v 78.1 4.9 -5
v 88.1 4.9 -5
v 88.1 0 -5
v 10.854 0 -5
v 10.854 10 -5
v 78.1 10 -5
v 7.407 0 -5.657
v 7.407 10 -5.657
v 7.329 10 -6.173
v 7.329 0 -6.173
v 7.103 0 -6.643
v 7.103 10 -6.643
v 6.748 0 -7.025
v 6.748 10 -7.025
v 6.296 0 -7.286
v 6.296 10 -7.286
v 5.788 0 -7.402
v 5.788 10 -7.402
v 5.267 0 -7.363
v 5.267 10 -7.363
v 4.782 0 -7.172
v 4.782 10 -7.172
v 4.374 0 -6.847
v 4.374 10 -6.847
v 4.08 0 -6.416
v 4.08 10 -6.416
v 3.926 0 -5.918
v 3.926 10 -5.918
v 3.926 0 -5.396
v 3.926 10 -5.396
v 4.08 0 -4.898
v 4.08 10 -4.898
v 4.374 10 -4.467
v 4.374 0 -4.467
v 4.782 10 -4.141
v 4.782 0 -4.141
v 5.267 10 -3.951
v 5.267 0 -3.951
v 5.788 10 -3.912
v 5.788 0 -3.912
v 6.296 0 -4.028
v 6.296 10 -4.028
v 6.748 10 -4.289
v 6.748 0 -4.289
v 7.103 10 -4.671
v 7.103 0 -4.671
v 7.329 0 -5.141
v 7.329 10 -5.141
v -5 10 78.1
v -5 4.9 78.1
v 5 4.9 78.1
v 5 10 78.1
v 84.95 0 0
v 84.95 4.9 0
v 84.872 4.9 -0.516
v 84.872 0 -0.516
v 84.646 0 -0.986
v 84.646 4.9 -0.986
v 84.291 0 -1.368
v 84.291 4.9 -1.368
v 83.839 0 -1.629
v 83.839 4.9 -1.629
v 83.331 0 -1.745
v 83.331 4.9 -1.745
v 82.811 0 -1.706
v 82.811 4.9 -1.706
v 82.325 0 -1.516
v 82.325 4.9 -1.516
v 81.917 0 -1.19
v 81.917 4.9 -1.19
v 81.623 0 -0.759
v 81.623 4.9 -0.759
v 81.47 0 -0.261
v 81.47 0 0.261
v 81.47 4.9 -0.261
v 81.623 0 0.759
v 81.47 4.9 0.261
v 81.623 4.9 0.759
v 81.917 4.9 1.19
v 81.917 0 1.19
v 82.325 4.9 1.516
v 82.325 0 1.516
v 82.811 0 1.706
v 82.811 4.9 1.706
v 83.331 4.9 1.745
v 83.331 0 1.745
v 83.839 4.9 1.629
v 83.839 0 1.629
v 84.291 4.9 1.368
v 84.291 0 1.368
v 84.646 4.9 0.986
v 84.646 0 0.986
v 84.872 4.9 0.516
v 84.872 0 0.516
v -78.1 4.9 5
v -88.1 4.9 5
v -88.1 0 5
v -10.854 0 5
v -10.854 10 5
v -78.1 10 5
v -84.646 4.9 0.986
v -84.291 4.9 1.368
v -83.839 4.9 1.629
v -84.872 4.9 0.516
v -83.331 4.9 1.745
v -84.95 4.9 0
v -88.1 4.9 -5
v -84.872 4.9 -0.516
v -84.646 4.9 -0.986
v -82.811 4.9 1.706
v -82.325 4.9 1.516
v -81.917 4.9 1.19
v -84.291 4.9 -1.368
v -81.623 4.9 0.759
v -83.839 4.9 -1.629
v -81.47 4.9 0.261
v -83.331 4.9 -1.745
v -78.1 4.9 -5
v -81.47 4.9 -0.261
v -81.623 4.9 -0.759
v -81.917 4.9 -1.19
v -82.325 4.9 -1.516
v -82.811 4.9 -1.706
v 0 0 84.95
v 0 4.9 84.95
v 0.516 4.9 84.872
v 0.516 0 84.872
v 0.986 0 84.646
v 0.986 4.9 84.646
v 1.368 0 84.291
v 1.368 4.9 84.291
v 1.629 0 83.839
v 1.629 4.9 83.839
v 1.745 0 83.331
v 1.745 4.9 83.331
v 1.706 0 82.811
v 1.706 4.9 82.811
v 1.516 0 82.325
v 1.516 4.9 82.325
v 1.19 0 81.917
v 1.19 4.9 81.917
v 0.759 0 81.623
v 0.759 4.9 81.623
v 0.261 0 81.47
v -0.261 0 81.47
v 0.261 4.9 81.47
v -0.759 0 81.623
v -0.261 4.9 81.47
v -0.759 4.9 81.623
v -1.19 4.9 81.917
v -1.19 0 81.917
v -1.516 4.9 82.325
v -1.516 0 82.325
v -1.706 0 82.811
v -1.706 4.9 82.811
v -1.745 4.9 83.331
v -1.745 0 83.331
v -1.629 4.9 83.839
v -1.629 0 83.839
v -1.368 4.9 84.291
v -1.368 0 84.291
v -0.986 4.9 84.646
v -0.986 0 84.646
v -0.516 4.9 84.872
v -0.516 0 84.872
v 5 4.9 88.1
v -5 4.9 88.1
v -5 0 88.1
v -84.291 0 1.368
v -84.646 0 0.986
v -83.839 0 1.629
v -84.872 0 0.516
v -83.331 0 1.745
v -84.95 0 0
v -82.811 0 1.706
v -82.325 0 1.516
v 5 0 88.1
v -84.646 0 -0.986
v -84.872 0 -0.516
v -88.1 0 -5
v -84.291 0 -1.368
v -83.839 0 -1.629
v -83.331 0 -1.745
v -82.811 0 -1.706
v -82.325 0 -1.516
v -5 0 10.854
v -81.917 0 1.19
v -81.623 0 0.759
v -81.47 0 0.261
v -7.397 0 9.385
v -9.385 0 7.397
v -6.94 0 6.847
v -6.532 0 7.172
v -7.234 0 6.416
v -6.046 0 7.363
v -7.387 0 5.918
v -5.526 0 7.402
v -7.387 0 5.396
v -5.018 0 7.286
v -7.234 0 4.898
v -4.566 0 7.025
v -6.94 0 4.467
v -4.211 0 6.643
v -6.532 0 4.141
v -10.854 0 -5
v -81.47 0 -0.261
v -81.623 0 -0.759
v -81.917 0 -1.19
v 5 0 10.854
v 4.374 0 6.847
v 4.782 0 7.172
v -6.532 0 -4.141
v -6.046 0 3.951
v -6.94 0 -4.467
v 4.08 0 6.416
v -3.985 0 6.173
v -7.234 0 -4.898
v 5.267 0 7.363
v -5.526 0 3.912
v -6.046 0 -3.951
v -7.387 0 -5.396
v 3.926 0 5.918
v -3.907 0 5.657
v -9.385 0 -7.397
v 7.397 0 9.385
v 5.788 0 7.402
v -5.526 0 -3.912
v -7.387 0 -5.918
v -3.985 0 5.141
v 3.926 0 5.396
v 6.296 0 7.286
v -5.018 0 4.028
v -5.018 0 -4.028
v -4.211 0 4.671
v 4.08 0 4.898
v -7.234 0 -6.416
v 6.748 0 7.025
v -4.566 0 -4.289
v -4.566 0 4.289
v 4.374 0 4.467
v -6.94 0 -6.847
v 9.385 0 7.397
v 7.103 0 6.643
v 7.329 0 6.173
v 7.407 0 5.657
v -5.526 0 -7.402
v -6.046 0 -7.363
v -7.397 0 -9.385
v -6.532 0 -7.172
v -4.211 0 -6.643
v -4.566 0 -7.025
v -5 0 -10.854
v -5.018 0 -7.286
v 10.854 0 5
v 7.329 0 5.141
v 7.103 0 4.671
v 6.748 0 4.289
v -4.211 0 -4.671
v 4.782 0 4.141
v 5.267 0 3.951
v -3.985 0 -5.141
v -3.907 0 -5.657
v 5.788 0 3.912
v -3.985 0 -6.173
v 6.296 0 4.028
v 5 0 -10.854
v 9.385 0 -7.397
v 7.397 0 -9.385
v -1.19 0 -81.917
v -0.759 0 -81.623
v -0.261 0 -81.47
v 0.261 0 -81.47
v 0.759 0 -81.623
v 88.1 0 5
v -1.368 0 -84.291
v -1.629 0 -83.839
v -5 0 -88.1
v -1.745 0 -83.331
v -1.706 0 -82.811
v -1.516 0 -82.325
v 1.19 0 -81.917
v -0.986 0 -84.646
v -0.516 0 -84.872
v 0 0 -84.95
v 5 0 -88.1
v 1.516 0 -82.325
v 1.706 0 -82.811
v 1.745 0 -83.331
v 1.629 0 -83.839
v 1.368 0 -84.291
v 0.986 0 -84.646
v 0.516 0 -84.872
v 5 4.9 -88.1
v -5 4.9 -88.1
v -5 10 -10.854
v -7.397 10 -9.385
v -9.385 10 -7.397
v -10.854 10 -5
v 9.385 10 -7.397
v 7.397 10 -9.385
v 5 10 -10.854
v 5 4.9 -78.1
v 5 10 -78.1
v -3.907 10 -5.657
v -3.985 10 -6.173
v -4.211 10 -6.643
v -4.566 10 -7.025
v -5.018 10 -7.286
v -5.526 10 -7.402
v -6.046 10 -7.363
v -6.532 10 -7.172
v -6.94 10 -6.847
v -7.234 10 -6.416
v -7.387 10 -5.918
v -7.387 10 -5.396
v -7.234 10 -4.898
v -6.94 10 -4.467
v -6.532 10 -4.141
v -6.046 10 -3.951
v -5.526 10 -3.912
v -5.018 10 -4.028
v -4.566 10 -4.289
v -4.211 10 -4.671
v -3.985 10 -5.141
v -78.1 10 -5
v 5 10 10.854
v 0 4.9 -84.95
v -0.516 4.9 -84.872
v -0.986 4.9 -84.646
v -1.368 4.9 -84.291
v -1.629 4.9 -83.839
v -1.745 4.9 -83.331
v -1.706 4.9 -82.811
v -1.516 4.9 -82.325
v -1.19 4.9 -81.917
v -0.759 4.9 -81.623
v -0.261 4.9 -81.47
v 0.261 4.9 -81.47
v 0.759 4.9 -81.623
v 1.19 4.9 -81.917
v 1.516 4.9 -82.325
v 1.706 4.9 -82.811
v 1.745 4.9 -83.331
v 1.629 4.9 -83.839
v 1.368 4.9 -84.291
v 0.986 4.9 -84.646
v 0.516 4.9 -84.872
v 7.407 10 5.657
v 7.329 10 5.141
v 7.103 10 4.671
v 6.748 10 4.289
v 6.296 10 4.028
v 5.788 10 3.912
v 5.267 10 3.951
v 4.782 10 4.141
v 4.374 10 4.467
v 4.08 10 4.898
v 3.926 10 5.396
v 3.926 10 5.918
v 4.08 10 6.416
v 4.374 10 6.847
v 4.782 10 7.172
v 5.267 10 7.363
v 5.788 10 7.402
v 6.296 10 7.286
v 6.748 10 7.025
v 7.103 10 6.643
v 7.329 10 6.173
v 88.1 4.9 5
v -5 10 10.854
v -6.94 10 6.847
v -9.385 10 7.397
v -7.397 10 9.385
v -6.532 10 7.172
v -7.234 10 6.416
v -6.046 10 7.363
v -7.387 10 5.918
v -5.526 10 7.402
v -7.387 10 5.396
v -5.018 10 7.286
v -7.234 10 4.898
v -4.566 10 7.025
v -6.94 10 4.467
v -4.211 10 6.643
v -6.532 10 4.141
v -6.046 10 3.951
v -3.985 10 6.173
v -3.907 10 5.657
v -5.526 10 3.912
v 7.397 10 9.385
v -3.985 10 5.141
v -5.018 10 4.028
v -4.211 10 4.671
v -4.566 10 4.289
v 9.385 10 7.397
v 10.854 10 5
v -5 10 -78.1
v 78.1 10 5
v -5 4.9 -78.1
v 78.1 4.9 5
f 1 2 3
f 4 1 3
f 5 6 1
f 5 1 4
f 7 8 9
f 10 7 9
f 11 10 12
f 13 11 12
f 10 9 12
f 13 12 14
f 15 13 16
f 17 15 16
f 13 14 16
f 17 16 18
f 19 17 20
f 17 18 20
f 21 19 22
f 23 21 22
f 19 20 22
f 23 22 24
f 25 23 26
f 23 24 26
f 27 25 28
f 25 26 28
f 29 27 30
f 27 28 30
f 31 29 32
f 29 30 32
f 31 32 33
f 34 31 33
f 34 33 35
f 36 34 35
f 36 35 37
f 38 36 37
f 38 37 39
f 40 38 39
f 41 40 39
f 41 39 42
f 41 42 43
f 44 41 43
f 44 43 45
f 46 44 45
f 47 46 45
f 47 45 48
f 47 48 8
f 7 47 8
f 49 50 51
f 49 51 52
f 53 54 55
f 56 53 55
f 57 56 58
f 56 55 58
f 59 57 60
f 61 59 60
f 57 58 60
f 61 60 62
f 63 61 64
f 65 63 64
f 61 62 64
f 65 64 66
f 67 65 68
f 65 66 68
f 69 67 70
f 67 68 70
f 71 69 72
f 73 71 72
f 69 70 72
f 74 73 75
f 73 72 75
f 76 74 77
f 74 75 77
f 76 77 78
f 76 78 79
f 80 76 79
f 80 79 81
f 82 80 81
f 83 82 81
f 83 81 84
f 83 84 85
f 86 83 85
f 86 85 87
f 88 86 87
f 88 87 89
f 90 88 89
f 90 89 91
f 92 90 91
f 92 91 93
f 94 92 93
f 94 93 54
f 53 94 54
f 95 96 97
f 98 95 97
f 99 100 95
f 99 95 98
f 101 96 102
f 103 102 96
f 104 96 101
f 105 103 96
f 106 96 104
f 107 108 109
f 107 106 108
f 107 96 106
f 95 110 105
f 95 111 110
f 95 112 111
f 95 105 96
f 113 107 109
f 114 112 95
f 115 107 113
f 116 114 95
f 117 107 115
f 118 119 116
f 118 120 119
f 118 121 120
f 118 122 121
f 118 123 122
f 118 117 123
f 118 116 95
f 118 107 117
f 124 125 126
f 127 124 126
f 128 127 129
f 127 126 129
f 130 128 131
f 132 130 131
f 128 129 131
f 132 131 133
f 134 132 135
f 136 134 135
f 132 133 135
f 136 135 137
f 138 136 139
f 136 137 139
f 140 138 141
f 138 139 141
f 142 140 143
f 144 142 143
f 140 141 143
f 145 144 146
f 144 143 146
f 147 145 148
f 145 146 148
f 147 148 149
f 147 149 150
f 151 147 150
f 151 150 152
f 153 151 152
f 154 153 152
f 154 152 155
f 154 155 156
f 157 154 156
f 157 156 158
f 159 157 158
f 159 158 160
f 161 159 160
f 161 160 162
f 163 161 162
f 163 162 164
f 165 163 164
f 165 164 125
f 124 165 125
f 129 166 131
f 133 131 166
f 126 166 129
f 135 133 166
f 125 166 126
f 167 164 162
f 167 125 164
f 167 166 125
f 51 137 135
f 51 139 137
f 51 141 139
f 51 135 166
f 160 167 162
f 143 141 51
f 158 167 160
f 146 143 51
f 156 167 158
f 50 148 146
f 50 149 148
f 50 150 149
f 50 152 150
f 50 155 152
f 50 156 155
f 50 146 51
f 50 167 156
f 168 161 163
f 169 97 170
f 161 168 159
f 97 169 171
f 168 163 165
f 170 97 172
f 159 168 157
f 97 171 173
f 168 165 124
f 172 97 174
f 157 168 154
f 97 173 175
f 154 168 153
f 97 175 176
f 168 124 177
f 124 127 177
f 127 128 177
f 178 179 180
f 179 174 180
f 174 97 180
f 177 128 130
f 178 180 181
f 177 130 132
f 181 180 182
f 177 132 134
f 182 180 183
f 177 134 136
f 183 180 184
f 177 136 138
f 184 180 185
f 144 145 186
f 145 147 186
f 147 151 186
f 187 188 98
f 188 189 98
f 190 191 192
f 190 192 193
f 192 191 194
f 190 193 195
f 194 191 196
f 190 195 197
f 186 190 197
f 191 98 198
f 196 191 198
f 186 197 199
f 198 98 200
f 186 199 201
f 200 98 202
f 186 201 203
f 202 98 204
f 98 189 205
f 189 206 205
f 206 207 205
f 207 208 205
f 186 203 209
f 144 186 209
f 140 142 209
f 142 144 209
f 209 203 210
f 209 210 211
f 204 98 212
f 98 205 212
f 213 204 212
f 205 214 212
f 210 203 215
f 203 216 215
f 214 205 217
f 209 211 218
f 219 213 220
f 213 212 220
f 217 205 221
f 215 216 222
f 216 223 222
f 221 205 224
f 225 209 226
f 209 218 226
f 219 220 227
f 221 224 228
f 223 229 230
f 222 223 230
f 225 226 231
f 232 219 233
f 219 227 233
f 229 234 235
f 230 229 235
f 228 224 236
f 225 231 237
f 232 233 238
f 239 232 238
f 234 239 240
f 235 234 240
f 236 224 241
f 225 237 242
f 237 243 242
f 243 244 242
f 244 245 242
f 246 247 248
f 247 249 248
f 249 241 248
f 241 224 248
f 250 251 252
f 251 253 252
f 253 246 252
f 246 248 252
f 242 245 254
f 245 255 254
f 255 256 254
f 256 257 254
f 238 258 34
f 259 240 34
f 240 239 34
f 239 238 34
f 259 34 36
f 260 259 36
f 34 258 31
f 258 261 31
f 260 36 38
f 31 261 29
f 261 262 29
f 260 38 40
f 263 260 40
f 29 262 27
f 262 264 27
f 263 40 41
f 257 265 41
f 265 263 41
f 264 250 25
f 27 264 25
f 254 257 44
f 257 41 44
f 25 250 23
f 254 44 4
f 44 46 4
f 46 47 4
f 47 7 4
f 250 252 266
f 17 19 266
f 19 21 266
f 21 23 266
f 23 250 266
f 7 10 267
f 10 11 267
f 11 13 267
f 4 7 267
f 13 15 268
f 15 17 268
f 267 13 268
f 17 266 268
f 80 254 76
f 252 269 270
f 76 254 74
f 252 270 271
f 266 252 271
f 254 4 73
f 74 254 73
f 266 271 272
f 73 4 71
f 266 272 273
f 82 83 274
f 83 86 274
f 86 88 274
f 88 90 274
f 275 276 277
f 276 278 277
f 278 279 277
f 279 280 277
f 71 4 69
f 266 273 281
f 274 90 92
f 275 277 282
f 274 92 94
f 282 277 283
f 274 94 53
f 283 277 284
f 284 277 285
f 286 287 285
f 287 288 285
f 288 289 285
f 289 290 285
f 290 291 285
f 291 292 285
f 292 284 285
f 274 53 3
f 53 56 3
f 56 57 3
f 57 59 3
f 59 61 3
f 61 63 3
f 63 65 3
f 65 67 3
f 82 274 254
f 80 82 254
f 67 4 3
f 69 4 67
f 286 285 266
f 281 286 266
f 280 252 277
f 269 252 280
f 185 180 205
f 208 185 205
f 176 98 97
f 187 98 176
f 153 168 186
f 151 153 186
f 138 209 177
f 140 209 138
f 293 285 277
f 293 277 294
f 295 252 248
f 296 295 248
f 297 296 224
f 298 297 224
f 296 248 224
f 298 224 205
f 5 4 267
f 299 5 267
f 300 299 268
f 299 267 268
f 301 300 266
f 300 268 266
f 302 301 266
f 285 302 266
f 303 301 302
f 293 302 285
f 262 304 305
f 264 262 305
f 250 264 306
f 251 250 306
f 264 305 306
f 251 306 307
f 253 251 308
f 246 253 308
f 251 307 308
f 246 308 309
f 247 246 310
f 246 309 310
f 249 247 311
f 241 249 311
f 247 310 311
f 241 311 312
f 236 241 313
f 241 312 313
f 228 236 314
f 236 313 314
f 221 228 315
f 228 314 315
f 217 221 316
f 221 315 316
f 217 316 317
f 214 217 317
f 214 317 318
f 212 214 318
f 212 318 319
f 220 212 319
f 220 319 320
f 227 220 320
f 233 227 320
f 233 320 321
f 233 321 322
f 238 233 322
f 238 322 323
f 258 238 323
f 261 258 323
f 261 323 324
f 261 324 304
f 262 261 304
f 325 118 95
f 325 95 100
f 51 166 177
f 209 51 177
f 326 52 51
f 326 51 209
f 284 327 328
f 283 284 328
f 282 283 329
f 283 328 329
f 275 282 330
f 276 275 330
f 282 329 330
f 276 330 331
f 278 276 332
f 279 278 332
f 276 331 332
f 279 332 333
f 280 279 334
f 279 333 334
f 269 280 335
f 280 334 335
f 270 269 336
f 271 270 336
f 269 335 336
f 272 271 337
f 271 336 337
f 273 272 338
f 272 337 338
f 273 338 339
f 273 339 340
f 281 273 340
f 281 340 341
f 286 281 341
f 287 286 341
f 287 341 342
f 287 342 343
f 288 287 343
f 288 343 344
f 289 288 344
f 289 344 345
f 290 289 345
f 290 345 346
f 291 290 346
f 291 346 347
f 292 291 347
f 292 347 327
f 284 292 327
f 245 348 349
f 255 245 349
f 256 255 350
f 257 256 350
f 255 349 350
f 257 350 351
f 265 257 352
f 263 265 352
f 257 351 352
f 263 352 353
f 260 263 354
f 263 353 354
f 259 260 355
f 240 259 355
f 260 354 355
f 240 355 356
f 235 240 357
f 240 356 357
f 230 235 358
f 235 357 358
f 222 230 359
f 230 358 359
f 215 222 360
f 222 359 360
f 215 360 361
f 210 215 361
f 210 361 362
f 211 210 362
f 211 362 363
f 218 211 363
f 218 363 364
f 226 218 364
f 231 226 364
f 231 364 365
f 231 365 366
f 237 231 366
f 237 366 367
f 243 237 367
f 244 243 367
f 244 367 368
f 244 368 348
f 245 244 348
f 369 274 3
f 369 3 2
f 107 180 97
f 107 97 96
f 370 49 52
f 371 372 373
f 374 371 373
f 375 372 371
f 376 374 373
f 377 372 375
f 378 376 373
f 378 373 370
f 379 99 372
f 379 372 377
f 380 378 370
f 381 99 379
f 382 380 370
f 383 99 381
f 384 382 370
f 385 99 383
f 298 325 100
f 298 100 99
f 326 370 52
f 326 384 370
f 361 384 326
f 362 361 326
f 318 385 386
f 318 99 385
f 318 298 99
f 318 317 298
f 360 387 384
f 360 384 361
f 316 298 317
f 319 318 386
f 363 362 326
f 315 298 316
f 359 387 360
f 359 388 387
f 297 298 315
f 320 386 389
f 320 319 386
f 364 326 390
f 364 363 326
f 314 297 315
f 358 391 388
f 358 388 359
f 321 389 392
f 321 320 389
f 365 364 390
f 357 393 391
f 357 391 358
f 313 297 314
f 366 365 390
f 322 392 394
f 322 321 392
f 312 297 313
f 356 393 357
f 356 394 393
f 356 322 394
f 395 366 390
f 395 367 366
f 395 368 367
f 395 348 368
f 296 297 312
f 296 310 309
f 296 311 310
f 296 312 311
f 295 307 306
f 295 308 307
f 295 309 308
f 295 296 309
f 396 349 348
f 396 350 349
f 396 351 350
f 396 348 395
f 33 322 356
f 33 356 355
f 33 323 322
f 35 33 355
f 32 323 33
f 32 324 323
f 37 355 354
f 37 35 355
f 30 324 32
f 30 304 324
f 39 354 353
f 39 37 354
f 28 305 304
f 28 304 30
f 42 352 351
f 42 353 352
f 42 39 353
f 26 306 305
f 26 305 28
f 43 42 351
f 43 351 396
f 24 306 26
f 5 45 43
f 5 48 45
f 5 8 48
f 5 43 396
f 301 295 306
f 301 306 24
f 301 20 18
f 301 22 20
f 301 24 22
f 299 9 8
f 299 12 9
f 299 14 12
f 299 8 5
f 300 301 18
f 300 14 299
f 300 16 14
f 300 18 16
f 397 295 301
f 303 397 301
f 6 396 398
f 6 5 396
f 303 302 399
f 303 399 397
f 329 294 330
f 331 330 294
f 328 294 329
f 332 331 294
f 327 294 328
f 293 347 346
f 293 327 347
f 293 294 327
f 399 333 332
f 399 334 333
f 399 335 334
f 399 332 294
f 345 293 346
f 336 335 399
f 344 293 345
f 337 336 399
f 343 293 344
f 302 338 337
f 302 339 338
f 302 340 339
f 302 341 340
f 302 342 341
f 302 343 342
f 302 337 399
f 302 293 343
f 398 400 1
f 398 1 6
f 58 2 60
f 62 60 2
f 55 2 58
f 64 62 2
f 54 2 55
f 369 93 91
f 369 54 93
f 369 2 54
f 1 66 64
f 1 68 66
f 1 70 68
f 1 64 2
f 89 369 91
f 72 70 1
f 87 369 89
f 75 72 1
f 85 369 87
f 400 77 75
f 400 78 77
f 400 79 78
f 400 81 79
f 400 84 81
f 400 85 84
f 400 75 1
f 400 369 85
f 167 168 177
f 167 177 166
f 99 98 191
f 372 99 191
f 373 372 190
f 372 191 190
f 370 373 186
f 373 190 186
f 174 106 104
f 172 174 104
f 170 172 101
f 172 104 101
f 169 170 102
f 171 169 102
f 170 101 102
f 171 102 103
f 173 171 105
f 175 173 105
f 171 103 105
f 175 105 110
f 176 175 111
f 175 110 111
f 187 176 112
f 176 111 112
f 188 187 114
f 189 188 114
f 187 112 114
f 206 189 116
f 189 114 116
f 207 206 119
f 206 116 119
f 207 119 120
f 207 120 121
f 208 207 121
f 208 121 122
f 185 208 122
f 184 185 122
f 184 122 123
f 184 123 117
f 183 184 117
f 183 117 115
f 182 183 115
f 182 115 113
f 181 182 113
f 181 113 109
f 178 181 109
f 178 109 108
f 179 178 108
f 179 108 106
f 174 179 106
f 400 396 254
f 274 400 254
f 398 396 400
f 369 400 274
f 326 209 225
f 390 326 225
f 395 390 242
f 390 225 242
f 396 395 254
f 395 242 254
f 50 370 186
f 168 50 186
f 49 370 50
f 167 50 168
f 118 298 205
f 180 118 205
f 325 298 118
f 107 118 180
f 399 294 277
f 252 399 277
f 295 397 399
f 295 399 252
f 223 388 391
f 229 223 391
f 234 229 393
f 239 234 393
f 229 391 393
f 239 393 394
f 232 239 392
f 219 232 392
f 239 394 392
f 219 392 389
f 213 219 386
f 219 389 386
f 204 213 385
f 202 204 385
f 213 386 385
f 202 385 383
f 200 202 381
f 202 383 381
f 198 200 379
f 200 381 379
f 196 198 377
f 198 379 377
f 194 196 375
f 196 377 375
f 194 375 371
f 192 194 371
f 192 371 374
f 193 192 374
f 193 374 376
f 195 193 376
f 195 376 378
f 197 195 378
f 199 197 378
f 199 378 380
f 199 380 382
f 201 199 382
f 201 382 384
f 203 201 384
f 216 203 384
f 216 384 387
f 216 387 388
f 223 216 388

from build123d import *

# Parameters (mm, degrees)
SKETCH1_R           = 11.95
BOSS_EXTRUDE1_DEPTH = 10
BOSS_EXTRUDE2_DEPTH = 10
CUT_EXTRUDE2_DEPTH  = 17.95
SKETCH6_R           = 1.75
CUT_EXTRUDE4_DEPTH  = 10
CIRPATTERN2_COUNT   = 4
SKETCH5_R           = 1.75
CUT_EXTRUDE3_DEPTH  = 11


with BuildPart() as part:
    # Sketch1 → Boss-Extrude1 (new body)
    with BuildSketch(Plane(origin=(0, 0, 0), x_dir=(1, 0, 0), z_dir=(0, 1, 0))):
        Circle(SKETCH1_R)
    extrude(amount=BOSS_EXTRUDE1_DEPTH)

    # Sketch2 → Boss-Extrude2 (add)
    with BuildSketch(Plane(origin=(0, 10, 0), x_dir=(1, 0, 0), z_dir=(0, 1, 0))):
        with BuildLine():
            Line((10.85368601, -5), (98.2, -5))
            Line((98.2, -5), (98.2, 5))
            Line((98.2, 5), (10.85368601, 5))
            ThreePointArc((10.85368601, 5), (11.95, 0), (10.85368601, -5))
        make_face()
    boss_extrude2 = extrude(amount=-BOSS_EXTRUDE2_DEPTH)

    # Sketch4 → Cut-Extrude2 (cut, through all)
    with BuildSketch(Plane.XY.offset(5)):
        Polygon((88.1, 0), (88.1, 4.9), (78.1, 4.9), (78.1, 10), (98.2, 10), (98.2, 0), align=None)
    cut_extrude2 = extrude(amount=-CUT_EXTRUDE2_DEPTH, mode=Mode.SUBTRACT)

    # Sketch6 → Cut-Extrude4 (cut)
    with BuildSketch(Plane(origin=(0, 4.9, 0), x_dir=(1, 0, 0), z_dir=(0, 1, 0))):
        with Locations((83.2, 0)):
            Circle(SKETCH6_R)
    cut_extrude4 = extrude(amount=-CUT_EXTRUDE4_DEPTH, mode=Mode.SUBTRACT)

    # CirPattern2: Boss-Extrude2, Cut-Extrude2, Cut-Extrude4 ×4 about axis
    cirpattern2_axis = Axis((0, 0, 0), (0, 1, 0))
    for i in range(1, CIRPATTERN2_COUNT):
        add(boss_extrude2.rotate(cirpattern2_axis, i * 360 / CIRPATTERN2_COUNT))
        add(cut_extrude2.rotate(cirpattern2_axis, i * 360 / CIRPATTERN2_COUNT), mode=Mode.SUBTRACT)
        add(cut_extrude4.rotate(cirpattern2_axis, i * 360 / CIRPATTERN2_COUNT), mode=Mode.SUBTRACT)

    # Sketch5 → Cut-Extrude3 (cut, through all)
    with BuildSketch(Plane(origin=(0, 10, 0), x_dir=(1, 0, 0), z_dir=(0, 1, 0))):
        with Locations((5.656854249, 5.656854249)):
            Circle(SKETCH5_R)
        with Locations((5.656854249, -5.656854249)):
            Circle(SKETCH5_R)
        with Locations((-5.656854249, -5.656854249)):
            Circle(SKETCH5_R)
        with Locations((-5.656854249, 5.656854249)):
            Circle(SKETCH5_R)
    extrude(amount=-CUT_EXTRUDE3_DEPTH, mode=Mode.SUBTRACT)


solid = part.part
